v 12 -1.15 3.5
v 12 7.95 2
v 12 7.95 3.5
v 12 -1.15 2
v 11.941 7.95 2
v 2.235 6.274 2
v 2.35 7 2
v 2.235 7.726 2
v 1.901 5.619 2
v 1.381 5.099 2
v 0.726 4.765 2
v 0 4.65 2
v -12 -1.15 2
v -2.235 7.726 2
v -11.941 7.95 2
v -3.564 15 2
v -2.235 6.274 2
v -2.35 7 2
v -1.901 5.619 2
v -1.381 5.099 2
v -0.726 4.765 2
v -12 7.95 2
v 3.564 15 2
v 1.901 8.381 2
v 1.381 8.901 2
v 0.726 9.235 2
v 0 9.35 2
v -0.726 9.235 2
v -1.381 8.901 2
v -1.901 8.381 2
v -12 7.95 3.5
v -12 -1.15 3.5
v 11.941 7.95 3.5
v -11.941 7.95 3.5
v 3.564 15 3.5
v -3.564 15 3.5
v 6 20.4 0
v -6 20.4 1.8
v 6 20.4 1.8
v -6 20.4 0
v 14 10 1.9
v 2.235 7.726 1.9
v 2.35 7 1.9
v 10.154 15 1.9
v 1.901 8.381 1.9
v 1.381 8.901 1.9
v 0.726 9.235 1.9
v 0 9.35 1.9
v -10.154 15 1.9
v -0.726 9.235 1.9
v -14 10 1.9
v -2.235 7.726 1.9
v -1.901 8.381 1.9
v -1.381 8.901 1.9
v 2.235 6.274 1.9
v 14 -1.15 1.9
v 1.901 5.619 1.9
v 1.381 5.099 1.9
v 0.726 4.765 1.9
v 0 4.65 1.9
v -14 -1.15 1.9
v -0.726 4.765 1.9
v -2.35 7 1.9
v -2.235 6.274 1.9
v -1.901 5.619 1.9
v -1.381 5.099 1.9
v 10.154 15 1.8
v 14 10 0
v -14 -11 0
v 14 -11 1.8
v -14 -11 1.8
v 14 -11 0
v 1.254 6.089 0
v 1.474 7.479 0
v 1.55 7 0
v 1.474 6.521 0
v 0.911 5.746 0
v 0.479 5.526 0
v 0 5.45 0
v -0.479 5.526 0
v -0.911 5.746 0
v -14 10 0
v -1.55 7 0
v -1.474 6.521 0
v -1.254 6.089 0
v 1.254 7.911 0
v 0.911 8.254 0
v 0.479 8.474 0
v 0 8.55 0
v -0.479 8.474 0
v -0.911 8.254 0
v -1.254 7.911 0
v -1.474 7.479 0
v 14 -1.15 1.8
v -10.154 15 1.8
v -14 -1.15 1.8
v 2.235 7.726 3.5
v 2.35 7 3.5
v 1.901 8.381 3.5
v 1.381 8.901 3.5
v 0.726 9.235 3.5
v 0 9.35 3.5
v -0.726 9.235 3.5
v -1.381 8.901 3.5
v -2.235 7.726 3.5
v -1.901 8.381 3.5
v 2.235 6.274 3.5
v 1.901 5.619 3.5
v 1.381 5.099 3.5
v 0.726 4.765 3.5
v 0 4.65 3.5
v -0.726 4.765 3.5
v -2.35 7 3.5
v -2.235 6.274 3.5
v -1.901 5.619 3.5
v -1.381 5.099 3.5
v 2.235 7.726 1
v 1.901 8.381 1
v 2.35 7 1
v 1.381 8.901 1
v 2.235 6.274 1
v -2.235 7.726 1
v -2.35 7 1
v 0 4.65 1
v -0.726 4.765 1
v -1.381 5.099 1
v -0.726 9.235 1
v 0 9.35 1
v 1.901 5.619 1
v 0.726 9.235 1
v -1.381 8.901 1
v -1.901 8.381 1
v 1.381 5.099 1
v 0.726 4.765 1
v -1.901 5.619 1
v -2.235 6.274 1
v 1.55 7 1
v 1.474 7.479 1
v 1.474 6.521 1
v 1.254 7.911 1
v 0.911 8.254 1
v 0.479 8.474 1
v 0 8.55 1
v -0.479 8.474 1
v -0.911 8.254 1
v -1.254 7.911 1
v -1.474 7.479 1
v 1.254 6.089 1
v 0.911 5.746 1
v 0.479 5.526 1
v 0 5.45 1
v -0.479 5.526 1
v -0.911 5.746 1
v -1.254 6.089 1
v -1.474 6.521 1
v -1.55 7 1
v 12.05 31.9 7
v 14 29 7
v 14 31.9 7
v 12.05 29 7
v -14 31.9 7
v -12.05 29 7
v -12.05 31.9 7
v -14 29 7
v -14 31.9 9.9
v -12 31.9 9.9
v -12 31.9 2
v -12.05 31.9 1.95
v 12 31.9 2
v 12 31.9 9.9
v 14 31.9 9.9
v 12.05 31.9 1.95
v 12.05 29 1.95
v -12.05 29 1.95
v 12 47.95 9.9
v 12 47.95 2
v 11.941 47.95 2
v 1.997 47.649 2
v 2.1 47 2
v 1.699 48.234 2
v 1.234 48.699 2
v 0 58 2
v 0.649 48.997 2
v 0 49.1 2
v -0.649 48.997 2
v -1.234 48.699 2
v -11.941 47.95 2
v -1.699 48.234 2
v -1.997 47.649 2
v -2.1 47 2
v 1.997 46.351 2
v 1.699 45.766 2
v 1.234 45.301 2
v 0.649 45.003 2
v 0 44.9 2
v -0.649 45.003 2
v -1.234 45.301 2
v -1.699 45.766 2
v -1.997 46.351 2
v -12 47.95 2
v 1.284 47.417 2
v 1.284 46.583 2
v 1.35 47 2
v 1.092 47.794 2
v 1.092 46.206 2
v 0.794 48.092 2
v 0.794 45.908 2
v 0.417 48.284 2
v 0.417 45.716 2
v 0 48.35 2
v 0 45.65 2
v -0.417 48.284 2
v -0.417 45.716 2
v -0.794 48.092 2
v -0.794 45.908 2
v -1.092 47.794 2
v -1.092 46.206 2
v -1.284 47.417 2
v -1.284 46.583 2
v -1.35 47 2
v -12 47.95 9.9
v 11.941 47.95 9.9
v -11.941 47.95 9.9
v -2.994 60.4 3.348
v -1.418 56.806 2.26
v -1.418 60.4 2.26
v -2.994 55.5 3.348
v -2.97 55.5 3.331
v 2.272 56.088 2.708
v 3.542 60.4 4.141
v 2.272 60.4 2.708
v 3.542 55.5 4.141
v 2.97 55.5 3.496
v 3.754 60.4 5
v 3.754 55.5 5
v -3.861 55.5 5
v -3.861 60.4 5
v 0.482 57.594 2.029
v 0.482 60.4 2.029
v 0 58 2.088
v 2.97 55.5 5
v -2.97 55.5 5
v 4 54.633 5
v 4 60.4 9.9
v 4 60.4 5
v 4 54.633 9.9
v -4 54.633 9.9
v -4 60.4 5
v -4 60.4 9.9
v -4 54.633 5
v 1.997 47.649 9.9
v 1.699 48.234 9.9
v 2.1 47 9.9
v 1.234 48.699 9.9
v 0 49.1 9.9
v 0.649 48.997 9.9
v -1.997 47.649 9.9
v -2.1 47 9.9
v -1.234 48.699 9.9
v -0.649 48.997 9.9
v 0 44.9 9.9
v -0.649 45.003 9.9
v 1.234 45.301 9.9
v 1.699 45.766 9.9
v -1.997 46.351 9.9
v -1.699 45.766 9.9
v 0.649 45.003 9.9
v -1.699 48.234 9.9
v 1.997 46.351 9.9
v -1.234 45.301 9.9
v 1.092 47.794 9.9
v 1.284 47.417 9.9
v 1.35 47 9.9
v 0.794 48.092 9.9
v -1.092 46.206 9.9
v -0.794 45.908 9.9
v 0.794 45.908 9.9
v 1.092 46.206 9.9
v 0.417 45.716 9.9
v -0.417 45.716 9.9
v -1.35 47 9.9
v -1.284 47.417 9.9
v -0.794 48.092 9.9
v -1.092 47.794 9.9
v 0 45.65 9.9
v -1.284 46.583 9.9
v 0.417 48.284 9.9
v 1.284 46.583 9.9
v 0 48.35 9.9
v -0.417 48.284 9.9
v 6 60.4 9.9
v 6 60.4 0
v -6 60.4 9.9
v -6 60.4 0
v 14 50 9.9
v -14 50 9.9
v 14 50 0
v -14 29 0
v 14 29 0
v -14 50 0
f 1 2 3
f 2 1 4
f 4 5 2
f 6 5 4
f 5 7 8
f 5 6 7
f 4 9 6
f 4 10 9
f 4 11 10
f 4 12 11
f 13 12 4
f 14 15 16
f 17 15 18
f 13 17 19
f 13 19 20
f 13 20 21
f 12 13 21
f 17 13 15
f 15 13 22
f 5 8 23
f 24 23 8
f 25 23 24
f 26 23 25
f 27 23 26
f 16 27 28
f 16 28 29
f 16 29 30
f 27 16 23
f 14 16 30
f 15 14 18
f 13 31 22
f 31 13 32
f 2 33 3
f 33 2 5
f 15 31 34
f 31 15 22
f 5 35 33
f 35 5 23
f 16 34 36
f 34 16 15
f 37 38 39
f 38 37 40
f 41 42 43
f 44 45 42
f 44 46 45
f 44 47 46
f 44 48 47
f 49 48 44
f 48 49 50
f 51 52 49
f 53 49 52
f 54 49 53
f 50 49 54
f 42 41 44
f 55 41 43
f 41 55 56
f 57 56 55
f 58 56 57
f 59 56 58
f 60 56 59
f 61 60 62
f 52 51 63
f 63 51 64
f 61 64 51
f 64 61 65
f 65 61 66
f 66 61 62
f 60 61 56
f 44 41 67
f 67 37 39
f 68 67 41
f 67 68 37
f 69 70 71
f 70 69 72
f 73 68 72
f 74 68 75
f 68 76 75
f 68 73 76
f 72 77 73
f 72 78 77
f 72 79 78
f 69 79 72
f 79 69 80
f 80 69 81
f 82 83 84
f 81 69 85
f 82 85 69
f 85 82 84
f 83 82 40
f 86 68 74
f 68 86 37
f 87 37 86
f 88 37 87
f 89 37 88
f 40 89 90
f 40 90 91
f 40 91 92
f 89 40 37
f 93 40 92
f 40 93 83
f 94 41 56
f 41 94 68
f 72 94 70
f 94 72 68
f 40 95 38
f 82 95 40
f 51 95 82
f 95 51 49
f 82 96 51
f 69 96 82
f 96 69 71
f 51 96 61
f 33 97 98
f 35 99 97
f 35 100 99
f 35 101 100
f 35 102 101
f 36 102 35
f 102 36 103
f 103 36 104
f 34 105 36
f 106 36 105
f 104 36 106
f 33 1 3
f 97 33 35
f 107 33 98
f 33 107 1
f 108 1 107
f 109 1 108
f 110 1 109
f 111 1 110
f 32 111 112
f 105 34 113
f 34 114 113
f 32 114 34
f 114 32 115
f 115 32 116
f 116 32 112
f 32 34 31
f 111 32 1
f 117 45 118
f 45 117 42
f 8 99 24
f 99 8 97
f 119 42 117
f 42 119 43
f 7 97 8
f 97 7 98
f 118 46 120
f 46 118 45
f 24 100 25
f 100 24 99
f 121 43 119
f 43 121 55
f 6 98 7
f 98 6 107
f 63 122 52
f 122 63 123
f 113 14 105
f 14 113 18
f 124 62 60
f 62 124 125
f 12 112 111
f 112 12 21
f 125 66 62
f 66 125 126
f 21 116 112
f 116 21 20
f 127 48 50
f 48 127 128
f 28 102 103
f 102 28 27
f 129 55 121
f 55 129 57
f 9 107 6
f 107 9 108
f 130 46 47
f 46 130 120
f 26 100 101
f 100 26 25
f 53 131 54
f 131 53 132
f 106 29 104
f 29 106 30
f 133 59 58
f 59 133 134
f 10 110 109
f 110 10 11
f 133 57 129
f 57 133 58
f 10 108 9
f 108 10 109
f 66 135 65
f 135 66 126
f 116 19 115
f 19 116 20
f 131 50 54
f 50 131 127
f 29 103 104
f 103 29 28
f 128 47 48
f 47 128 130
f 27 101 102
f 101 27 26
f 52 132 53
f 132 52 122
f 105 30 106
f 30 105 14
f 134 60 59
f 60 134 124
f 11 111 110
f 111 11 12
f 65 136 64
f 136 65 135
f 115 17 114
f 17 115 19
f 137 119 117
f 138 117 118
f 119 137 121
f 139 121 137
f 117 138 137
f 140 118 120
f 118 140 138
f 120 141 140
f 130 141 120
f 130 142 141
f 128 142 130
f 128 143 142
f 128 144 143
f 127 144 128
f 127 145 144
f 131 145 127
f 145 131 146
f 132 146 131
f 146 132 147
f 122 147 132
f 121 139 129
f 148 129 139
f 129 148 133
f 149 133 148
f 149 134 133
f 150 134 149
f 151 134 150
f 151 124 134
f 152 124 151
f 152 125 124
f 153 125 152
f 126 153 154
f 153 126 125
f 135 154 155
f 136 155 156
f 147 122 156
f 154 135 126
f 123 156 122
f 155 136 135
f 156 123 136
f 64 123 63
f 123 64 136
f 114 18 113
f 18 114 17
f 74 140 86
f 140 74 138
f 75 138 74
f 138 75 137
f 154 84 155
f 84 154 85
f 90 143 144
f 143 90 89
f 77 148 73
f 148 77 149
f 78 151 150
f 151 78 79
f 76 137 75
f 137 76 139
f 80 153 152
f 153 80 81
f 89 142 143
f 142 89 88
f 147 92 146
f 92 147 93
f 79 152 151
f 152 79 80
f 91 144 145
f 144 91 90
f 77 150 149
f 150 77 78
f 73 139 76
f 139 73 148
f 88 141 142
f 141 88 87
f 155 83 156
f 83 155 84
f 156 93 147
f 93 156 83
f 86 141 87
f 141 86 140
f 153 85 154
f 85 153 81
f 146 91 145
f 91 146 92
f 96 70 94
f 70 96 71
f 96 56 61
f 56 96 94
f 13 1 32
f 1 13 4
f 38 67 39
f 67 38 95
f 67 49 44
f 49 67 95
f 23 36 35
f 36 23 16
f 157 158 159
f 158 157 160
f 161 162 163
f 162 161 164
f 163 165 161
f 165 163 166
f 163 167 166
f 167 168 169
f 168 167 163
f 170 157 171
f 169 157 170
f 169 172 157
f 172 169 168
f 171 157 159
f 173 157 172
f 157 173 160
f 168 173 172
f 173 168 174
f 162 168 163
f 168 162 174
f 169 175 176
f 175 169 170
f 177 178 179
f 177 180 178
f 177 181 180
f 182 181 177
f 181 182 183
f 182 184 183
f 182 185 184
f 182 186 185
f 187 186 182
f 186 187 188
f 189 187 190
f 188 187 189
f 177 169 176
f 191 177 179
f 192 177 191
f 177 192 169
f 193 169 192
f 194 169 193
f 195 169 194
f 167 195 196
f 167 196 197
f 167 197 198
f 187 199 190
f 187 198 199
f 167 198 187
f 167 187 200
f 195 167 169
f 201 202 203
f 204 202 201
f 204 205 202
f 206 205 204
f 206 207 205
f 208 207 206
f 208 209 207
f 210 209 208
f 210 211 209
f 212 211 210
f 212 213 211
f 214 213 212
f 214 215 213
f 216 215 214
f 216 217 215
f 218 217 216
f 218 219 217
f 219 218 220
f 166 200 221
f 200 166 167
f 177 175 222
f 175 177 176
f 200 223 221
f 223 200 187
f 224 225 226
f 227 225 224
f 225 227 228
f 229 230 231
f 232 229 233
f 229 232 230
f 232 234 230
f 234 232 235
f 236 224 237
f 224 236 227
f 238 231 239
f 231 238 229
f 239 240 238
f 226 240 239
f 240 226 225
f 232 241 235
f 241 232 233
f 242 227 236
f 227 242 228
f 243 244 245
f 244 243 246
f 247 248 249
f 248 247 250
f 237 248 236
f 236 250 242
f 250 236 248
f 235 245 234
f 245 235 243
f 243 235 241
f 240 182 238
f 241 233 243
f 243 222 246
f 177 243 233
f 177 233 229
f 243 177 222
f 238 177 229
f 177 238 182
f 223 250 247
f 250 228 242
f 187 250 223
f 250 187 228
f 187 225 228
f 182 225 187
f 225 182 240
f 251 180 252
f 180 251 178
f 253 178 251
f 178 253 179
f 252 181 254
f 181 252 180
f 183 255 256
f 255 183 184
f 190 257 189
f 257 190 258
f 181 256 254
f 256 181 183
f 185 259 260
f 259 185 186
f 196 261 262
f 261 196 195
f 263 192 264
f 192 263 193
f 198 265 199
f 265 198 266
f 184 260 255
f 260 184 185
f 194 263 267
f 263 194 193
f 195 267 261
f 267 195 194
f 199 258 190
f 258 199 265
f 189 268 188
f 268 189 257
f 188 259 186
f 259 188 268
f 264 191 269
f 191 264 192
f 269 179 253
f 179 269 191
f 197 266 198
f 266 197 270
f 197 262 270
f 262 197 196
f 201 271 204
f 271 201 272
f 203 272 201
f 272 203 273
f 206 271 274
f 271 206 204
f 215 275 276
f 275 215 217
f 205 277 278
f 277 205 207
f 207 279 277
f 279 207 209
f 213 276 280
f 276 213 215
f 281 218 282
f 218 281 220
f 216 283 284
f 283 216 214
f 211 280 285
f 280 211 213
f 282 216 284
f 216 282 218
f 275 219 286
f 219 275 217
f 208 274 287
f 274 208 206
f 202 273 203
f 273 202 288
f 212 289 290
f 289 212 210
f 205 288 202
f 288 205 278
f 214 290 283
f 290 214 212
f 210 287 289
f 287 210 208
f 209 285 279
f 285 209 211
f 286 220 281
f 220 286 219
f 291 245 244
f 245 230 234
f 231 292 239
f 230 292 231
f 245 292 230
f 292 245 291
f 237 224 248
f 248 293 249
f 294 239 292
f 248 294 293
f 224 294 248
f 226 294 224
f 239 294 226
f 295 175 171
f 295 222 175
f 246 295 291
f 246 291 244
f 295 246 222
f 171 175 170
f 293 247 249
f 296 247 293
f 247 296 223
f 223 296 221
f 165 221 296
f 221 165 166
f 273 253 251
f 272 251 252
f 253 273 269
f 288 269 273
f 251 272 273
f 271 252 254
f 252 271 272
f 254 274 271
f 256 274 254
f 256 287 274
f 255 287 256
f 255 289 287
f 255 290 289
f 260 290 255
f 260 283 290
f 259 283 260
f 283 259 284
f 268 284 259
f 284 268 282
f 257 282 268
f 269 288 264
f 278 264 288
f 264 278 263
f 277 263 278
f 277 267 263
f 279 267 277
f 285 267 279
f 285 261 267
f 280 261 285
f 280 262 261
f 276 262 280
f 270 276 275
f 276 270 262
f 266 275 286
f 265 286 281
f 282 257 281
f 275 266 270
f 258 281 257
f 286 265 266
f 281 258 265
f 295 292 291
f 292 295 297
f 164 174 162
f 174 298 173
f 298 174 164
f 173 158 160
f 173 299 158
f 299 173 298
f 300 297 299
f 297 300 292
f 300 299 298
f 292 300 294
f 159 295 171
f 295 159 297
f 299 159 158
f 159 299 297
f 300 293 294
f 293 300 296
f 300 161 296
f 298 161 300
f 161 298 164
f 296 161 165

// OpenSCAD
/* 

This is an alternate to the https://www.thingiverse.com/thing:2482038 anet heat bed strain relief

USE IF YOU REMOVED THE PLUG AND SOLDERED DIRECTLY TO THE PINS

I had to do this because my plug was damaged and I couldn't source a replacement.

NOTE: Soldering is not usually advised in use where the joint will be flexed repeatedly as it causes a stress raiser at the wire-solder interface. I am not a (hardware) engineer, and I am *not* recommending this specific approach. It is working for me at this point, and I'll update here if any problems develop.

I secured the halves with a #8 x 1/2 inch wood screw.

Printed in PLA at 210 with .2mm layer height 4mm nozzle.
I plan to reprint in PETG for higher temps

TODO: 
 * make a "ramp" to reduce the chances of snagging the Y motor pulley.
 * improve the way the top interfaces with the bottom half.


*/


p_x=24;
p_y=16;
p_yy=10;
p_z=8;
b_z=3;
b_yy=3;
wall=2;
wire_r=4;
wire_y=5;
epsilon=0.1;
hr1=2.1;
hr2=1.35;

module plug(){
    difference(){
        union(){
            translate([0, - epsilon, p_z/2 + wall]){
            cube([p_x, p_y + epsilon, p_z],center=true);
                translate([0, -p_y/2 -b_yy/2,(p_z -b_z)/2]){
                    cube([p_x + 2*wall+epsilon, b_yy, b_z],center=true);
                    translate([0, 0,-4])
                        cube([p_x +epsilon, b_yy, 5.1],center=true);
                }
            }

            translate([0,0,wall])
            linear_extrude(height=p_z)
                polygon([[p_x / 2,p_y/2-epsilon],[-p_x/2,p_y/2-epsilon],[0,p_yy+p_y/2]]);


            translate([0,p_yy + p_y / 2 - wall - 0.5,wall + p_z /2])
            rotate([-90,0,0]){
            cylinder(h=wire_y,r=wire_r);
                translate([0,-2,0])
                cube([2*wire_r,3/2*wire_r,30],center=true);
            }
        }
        
        translate([0,p_y/2 -1, -3])
        difference(){
            cylinder(r=hr1, h=24, $fn=20);
            cylinder(r=hr2, h=24, $fn=20);
        }
    }
}

module bottom(){
    difference(){
        linear_extrude(height=p_z + wall - epsilon)
        polygon([[ -p_x/2 - wall,-p_y/2 - b_yy ],[ p_x/2 + wall,-p_y/2 - b_yy  ],
                    [p_x/2 + wall, p_y/2 + wall ],
                    [wire_r + wall,p_yy + p_y / 2 + wire_y /2 - epsilon],[-wire_r - wall,p_yy + p_y / 2 + wire_y /2- epsilon],
                    [-p_x/2 - wall, p_y/2 + wall ]
        ]);

        color([1,0,0])
        plug();
    }
}

module top(){
    difference(){
        union(){
            linear_extrude(height= wall - epsilon)
                polygon([[ -p_x/2 - wall,-p_y/2 - b_yy ],[ p_x/2 + wall,-p_y/2 - b_yy  ],
                    [p_x/2 + wall, p_y/2 + wall ],
                    [wire_r + wall,p_yy + p_y / 2 + wire_y /2 - epsilon],[-wire_r - wall,p_yy + p_y / 2 + wire_y /2- epsilon],
                    [-p_x/2 - wall, p_y/2 + wall ]
        ]);
            
            color([1,0,0])
               plug();
        }

        translate([0,10,3*wall / 2 + 5.5])
            cube([40,50,10],center=true);

        translate([0,p_y/2 -1, 1])
            cylinder(r=hr1+ 0.25, h=24, $fn=20);
        translate([0,p_y/2 -1, -1])
            cylinder(r=hr1- 0.55, h=24, $fn=20);

        translate([0, -p_y/2 -b_yy/2 + 3.35 ,3*wall/2 -2 *epsilon])
                        cube([p_x + 2*wall+epsilon, 10, wall],center=true);

        translate([0, p_yy + p_y/2 + wall ,3*wall/2 -2 *epsilon])
                        cube([p_x + 2*wall+epsilon, 10, wall],center=true);

    }
}
top();
translate([0,40,0])
bottom();
